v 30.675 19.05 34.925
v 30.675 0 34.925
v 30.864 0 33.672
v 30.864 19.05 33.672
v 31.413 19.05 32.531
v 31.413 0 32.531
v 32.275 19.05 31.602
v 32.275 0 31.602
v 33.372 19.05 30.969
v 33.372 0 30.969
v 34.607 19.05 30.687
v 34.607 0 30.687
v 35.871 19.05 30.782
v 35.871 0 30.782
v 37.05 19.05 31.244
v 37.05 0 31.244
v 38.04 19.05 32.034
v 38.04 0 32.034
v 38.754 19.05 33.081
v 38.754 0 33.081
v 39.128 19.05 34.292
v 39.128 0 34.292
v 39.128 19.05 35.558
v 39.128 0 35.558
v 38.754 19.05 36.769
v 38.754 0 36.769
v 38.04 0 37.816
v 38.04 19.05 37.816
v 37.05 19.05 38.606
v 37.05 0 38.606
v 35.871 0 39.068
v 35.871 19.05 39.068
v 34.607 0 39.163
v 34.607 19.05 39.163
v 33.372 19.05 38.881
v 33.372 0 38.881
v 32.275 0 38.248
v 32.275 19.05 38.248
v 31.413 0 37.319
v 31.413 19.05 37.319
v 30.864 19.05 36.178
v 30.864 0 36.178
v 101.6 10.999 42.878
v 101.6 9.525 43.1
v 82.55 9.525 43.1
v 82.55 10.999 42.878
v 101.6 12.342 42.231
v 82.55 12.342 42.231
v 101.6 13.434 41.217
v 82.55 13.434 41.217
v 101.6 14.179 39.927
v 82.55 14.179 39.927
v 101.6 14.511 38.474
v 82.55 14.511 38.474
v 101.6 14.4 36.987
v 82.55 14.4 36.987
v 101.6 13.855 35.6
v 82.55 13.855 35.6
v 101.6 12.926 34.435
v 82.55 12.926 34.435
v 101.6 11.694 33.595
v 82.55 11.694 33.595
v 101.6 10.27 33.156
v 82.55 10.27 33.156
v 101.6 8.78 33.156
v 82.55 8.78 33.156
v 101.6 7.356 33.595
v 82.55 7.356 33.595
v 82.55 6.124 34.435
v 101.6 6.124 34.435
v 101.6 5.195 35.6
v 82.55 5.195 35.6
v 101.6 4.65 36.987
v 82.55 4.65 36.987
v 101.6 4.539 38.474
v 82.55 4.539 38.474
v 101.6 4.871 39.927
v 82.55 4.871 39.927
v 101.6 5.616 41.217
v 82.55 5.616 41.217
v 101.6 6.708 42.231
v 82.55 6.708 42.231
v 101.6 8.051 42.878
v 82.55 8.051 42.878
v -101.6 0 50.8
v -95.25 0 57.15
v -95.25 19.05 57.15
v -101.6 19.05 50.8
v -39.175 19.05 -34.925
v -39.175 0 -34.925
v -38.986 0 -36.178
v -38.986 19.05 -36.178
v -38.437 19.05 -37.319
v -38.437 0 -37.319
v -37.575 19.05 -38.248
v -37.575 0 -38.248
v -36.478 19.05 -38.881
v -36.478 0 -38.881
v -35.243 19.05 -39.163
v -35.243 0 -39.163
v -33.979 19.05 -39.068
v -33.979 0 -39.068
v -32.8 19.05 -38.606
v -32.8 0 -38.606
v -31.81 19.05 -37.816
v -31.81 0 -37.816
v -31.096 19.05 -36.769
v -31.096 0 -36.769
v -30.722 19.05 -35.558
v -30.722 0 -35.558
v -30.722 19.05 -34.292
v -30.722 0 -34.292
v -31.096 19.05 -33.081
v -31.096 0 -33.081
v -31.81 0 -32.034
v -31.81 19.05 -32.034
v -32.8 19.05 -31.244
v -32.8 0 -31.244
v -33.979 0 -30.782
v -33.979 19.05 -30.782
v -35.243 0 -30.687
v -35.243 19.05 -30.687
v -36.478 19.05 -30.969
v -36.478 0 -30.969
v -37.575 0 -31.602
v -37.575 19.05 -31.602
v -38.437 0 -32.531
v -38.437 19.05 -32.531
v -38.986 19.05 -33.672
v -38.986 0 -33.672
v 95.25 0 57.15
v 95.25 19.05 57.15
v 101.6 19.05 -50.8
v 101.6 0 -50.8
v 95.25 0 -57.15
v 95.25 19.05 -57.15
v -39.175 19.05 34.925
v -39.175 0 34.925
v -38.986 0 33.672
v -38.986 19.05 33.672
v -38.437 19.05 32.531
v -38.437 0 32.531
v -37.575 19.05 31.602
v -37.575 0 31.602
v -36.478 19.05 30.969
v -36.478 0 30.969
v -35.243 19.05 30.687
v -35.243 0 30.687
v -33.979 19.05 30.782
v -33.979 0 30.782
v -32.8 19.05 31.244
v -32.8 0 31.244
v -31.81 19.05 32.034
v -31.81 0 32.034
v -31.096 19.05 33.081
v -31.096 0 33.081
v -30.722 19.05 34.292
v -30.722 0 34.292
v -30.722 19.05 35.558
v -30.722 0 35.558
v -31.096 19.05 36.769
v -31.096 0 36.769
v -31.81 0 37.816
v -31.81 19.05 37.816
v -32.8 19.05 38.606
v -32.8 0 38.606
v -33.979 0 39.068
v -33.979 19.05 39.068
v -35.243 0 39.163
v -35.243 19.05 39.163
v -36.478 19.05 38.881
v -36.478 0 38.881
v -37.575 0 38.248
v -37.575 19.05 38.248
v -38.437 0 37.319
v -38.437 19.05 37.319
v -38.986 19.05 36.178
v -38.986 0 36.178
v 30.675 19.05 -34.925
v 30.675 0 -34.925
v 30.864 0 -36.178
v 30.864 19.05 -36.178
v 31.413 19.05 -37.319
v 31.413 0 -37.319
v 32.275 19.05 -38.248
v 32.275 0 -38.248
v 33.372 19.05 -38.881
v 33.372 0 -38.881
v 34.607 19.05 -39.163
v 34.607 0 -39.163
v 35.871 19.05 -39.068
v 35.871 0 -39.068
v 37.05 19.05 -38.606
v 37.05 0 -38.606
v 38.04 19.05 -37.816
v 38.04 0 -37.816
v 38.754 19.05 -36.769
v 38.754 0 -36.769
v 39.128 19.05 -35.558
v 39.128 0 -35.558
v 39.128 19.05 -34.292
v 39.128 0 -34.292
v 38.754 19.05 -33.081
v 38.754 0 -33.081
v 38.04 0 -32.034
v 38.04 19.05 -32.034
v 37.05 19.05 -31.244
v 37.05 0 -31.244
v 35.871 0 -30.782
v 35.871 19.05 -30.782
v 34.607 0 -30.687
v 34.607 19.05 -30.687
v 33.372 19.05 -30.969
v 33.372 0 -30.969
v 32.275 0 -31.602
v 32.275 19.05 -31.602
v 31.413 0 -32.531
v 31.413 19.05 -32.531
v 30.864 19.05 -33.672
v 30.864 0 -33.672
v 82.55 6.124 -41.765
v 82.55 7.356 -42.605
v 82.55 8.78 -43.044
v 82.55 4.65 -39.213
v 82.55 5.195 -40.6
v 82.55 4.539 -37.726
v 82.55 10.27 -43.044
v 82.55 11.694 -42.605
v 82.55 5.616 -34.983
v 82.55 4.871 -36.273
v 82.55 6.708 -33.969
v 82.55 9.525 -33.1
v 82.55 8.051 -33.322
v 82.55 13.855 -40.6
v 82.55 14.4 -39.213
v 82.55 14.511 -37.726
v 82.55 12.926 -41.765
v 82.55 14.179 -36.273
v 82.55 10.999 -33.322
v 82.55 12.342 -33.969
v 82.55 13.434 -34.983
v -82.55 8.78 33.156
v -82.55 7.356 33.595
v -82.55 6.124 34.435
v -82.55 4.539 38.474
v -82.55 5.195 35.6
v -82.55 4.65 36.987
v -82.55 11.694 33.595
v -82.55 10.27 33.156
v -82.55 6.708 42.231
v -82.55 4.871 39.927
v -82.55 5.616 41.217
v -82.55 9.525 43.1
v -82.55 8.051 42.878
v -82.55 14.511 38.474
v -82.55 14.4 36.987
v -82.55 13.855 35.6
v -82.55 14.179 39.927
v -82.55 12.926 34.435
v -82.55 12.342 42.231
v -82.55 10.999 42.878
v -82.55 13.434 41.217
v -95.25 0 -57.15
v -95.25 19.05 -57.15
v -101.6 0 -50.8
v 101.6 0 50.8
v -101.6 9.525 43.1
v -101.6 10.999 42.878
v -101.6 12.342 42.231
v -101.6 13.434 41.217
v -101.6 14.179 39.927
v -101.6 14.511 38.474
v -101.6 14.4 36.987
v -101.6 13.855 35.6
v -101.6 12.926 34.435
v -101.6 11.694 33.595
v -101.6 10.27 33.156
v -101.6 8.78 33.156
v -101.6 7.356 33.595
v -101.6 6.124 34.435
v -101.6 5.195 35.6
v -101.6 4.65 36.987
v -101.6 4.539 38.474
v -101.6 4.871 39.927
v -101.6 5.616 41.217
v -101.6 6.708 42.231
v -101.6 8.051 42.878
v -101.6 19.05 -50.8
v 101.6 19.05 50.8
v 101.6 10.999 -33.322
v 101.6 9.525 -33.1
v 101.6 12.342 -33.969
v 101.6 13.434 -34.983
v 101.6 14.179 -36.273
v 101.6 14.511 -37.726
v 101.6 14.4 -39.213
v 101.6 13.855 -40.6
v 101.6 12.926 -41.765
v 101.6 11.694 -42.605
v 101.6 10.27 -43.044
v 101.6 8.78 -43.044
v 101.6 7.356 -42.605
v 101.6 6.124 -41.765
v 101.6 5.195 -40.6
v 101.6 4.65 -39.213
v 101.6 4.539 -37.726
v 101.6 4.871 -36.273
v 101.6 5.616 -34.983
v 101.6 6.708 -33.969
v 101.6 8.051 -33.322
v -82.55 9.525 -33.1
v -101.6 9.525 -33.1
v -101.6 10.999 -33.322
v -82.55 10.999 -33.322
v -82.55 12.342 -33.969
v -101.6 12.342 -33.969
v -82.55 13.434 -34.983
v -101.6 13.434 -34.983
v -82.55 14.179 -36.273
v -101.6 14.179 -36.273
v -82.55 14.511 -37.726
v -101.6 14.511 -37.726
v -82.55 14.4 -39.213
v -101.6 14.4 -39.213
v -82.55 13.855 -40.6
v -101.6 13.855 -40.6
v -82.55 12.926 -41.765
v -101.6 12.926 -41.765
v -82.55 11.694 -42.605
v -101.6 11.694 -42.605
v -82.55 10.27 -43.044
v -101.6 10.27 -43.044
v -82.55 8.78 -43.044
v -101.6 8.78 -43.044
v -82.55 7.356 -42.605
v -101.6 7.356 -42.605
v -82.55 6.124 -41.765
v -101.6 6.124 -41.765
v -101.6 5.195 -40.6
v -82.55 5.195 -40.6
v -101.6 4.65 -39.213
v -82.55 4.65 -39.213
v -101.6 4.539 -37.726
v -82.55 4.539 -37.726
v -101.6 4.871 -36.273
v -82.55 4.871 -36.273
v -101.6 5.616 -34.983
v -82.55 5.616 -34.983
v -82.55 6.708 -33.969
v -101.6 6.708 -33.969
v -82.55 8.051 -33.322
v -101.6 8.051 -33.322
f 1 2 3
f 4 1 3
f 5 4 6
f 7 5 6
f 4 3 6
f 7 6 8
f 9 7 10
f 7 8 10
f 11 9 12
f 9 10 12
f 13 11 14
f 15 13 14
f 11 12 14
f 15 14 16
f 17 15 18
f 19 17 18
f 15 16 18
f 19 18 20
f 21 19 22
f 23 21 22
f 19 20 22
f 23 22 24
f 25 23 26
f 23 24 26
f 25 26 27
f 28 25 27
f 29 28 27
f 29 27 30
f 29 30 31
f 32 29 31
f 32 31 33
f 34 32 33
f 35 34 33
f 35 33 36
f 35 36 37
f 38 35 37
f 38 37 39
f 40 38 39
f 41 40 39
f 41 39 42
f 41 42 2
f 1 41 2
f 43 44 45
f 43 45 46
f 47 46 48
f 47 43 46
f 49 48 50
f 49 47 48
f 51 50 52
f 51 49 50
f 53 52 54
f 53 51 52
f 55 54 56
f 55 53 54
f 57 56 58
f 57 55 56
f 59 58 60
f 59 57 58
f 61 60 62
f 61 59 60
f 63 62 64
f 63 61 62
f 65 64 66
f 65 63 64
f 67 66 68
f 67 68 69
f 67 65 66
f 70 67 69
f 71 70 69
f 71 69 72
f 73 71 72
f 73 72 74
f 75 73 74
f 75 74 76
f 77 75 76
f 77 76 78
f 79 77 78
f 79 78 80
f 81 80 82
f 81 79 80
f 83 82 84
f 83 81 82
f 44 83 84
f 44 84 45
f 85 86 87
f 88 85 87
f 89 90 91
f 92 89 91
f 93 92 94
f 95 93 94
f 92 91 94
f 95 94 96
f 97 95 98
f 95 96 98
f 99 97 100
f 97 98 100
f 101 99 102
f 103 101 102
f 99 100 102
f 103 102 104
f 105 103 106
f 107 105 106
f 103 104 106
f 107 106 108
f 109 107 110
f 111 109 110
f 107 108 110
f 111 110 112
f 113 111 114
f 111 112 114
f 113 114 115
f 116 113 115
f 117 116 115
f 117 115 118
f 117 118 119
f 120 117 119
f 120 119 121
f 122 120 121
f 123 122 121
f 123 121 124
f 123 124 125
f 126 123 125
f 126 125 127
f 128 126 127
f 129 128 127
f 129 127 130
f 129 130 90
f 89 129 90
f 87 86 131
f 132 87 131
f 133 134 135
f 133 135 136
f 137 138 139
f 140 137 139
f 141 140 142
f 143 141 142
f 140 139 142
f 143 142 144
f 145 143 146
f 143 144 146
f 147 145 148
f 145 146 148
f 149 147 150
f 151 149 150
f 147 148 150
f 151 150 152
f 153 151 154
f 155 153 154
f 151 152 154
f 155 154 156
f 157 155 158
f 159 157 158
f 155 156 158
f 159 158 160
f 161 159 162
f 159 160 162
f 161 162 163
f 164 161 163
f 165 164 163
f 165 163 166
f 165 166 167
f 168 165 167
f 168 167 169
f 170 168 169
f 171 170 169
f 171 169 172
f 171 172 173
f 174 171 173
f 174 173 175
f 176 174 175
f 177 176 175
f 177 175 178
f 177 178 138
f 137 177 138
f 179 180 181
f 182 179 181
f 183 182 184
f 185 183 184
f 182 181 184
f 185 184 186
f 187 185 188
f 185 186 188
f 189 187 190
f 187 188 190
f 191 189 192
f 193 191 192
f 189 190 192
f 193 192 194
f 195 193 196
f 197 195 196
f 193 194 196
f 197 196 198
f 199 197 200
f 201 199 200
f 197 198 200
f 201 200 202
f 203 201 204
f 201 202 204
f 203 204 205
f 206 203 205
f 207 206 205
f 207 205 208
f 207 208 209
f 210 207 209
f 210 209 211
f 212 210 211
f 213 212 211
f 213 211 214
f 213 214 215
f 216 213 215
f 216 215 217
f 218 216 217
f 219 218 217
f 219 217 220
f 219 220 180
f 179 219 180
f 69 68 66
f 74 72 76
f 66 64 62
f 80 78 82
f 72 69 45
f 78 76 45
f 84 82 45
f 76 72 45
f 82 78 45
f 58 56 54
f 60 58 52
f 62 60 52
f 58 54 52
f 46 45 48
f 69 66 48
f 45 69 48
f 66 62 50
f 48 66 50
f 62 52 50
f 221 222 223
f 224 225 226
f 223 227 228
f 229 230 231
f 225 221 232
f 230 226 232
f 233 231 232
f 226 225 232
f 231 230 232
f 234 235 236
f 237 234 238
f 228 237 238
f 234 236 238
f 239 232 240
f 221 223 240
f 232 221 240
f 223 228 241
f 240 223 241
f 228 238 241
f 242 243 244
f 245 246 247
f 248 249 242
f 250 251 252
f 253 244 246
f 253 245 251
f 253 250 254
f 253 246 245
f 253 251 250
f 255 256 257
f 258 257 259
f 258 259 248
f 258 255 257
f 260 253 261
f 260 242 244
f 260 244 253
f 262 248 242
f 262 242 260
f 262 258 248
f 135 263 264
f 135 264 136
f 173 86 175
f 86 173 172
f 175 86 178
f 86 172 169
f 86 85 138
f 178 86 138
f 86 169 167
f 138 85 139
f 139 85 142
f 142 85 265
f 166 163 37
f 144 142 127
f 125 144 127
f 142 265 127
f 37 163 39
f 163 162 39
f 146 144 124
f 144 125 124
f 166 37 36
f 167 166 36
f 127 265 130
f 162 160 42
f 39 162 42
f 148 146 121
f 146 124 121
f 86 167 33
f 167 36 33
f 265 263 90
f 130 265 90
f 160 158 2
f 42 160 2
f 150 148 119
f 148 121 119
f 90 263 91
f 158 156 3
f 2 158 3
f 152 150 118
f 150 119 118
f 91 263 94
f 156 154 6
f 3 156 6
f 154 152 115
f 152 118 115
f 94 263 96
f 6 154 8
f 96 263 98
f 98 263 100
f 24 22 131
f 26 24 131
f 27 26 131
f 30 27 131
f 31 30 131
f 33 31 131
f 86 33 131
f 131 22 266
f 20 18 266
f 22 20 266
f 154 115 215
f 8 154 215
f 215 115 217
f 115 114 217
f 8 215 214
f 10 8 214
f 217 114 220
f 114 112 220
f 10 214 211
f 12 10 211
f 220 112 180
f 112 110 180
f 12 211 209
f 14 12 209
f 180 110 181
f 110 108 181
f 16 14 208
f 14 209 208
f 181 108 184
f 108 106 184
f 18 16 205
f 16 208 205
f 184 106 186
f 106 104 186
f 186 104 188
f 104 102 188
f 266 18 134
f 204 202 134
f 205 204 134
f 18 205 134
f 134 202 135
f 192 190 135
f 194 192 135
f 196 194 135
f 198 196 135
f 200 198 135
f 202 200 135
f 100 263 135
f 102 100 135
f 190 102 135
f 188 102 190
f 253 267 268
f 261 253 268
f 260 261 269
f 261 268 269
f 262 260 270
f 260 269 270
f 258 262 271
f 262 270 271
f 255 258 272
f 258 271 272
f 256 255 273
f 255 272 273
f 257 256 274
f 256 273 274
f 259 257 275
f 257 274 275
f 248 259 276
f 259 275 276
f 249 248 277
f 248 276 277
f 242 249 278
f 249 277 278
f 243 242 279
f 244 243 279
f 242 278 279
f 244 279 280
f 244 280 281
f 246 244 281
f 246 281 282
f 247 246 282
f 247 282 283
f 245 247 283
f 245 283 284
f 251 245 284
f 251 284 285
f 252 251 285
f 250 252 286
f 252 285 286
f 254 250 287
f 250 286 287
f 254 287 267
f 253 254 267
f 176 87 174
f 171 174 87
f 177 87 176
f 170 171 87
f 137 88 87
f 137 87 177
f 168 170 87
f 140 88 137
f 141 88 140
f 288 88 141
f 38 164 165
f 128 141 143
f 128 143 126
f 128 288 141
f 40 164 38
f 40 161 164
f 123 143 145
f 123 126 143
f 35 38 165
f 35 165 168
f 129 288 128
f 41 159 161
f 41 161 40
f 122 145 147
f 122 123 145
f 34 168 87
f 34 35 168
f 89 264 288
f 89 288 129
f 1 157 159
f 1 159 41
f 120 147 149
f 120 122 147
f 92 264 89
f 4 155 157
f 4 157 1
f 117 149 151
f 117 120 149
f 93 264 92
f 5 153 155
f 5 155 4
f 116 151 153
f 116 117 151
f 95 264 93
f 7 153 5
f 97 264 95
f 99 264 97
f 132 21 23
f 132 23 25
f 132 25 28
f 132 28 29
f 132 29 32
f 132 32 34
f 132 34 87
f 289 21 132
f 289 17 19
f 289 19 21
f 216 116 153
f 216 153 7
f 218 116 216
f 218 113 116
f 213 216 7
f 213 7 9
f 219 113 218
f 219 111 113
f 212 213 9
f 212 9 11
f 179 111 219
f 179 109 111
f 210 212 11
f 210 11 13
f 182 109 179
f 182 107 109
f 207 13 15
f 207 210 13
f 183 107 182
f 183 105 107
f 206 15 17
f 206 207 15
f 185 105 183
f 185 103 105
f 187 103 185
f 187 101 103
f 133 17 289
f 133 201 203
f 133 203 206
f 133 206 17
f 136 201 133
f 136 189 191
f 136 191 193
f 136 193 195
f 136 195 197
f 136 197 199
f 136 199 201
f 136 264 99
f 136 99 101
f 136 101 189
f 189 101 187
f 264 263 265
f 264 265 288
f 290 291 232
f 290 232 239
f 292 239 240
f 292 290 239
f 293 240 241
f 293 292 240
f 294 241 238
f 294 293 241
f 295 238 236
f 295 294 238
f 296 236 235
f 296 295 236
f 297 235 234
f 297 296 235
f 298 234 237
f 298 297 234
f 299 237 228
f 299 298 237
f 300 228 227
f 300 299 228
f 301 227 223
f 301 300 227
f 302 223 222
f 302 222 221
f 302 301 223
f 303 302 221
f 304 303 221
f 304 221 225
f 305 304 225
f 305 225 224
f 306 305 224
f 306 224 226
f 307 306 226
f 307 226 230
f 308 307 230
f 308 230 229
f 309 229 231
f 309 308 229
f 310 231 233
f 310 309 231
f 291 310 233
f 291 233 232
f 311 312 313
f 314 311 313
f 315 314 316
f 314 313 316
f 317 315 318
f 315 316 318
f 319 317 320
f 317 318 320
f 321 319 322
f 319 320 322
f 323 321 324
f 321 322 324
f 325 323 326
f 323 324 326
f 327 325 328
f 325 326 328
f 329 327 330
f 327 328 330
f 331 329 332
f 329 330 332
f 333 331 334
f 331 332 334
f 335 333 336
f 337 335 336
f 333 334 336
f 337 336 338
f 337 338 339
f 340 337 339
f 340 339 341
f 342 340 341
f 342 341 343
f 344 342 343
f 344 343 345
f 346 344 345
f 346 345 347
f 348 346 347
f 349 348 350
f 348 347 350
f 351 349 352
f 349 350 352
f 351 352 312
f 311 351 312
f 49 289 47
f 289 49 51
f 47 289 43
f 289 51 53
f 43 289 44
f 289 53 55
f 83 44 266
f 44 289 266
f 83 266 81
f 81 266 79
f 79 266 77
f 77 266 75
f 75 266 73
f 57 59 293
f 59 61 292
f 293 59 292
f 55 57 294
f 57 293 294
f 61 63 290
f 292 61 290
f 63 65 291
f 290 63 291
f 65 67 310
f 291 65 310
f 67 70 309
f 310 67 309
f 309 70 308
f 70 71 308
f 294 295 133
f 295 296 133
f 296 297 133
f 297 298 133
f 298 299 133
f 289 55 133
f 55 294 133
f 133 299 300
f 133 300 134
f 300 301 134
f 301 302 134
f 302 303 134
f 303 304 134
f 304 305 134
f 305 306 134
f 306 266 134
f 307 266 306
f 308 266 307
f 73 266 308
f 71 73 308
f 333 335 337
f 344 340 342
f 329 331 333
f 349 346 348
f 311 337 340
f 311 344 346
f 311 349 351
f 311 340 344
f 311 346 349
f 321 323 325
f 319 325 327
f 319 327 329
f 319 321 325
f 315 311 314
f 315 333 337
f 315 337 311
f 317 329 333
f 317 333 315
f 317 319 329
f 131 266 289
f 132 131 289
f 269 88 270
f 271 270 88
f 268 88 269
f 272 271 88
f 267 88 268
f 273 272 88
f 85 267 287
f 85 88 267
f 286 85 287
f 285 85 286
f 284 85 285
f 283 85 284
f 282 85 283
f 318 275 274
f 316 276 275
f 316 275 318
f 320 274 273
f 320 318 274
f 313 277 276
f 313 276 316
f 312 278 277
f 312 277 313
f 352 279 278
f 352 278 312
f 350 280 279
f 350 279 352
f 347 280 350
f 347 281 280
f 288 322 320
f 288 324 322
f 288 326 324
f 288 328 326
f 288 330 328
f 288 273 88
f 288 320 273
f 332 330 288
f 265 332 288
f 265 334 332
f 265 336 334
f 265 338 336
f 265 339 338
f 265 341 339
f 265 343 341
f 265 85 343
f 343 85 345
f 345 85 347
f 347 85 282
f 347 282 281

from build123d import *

# Parameters (mm, degrees)
SKETCH1_W              = 203.2
SKETCH1_H              = 114.3
BOSS_EXTRUDE1_DEPTH    = 19.05
SKETCH2_R              = 5
CUT_EXTRUDE1_DEPTH     = 19.05
CHAMFER1_SIZE          = 6.35
M10X1_5_TAPPED_HOLE1_D = 8.5


with BuildPart() as part:
    # Sketch1 → Boss-Extrude1 (new body)
    with BuildSketch(Plane(origin=(0, 0, 0), x_dir=(1, 0, 0), z_dir=(0, 1, 0))):
        Rectangle(SKETCH1_W, SKETCH1_H)
    extrude(amount=BOSS_EXTRUDE1_DEPTH)

    # Sketch2 → Cut-Extrude1 (cut)
    with BuildSketch(Plane.ZY.offset(101.6)):
        with Locations((-38.1, 9.525)):
            Circle(SKETCH2_R)
        with Locations((38.1, 9.525)):
            Circle(SKETCH2_R)
    cut_extrude1 = extrude(amount=-CUT_EXTRUDE1_DEPTH, mode=Mode.SUBTRACT)

    # Mirror1: Cut-Extrude1 across plane
    add(cut_extrude1.mirror(Plane(origin=(0, 0, 0), x_dir=(0, 0, 1), z_dir=(1, 0, 0))), mode=Mode.SUBTRACT)

    # Chamfer1
    chamfer1_edges = [part.edges().sort_by_distance(p)[0] for p in [
        (101.6, 9.525, 57.15),
        (-101.6, 9.525, 57.15),
        (-101.6, 9.525, -57.15),
        (101.6, 9.525, -57.15),
    ]]
    chamfer(chamfer1_edges, length=CHAMFER1_SIZE)

    # M10x1.5 Tapped Hole1 (through all)
    with Locations(Plane(origin=(0, 19.05, 0), x_dir=(1, 0, 0), z_dir=(0, 1, 0))):
        with Locations((34.925, -34.925), (-34.925, -34.925), (34.925, 34.925), (-34.925, 34.925)):
            Hole(M10X1_5_TAPPED_HOLE1_D / 2)


solid = part.part
